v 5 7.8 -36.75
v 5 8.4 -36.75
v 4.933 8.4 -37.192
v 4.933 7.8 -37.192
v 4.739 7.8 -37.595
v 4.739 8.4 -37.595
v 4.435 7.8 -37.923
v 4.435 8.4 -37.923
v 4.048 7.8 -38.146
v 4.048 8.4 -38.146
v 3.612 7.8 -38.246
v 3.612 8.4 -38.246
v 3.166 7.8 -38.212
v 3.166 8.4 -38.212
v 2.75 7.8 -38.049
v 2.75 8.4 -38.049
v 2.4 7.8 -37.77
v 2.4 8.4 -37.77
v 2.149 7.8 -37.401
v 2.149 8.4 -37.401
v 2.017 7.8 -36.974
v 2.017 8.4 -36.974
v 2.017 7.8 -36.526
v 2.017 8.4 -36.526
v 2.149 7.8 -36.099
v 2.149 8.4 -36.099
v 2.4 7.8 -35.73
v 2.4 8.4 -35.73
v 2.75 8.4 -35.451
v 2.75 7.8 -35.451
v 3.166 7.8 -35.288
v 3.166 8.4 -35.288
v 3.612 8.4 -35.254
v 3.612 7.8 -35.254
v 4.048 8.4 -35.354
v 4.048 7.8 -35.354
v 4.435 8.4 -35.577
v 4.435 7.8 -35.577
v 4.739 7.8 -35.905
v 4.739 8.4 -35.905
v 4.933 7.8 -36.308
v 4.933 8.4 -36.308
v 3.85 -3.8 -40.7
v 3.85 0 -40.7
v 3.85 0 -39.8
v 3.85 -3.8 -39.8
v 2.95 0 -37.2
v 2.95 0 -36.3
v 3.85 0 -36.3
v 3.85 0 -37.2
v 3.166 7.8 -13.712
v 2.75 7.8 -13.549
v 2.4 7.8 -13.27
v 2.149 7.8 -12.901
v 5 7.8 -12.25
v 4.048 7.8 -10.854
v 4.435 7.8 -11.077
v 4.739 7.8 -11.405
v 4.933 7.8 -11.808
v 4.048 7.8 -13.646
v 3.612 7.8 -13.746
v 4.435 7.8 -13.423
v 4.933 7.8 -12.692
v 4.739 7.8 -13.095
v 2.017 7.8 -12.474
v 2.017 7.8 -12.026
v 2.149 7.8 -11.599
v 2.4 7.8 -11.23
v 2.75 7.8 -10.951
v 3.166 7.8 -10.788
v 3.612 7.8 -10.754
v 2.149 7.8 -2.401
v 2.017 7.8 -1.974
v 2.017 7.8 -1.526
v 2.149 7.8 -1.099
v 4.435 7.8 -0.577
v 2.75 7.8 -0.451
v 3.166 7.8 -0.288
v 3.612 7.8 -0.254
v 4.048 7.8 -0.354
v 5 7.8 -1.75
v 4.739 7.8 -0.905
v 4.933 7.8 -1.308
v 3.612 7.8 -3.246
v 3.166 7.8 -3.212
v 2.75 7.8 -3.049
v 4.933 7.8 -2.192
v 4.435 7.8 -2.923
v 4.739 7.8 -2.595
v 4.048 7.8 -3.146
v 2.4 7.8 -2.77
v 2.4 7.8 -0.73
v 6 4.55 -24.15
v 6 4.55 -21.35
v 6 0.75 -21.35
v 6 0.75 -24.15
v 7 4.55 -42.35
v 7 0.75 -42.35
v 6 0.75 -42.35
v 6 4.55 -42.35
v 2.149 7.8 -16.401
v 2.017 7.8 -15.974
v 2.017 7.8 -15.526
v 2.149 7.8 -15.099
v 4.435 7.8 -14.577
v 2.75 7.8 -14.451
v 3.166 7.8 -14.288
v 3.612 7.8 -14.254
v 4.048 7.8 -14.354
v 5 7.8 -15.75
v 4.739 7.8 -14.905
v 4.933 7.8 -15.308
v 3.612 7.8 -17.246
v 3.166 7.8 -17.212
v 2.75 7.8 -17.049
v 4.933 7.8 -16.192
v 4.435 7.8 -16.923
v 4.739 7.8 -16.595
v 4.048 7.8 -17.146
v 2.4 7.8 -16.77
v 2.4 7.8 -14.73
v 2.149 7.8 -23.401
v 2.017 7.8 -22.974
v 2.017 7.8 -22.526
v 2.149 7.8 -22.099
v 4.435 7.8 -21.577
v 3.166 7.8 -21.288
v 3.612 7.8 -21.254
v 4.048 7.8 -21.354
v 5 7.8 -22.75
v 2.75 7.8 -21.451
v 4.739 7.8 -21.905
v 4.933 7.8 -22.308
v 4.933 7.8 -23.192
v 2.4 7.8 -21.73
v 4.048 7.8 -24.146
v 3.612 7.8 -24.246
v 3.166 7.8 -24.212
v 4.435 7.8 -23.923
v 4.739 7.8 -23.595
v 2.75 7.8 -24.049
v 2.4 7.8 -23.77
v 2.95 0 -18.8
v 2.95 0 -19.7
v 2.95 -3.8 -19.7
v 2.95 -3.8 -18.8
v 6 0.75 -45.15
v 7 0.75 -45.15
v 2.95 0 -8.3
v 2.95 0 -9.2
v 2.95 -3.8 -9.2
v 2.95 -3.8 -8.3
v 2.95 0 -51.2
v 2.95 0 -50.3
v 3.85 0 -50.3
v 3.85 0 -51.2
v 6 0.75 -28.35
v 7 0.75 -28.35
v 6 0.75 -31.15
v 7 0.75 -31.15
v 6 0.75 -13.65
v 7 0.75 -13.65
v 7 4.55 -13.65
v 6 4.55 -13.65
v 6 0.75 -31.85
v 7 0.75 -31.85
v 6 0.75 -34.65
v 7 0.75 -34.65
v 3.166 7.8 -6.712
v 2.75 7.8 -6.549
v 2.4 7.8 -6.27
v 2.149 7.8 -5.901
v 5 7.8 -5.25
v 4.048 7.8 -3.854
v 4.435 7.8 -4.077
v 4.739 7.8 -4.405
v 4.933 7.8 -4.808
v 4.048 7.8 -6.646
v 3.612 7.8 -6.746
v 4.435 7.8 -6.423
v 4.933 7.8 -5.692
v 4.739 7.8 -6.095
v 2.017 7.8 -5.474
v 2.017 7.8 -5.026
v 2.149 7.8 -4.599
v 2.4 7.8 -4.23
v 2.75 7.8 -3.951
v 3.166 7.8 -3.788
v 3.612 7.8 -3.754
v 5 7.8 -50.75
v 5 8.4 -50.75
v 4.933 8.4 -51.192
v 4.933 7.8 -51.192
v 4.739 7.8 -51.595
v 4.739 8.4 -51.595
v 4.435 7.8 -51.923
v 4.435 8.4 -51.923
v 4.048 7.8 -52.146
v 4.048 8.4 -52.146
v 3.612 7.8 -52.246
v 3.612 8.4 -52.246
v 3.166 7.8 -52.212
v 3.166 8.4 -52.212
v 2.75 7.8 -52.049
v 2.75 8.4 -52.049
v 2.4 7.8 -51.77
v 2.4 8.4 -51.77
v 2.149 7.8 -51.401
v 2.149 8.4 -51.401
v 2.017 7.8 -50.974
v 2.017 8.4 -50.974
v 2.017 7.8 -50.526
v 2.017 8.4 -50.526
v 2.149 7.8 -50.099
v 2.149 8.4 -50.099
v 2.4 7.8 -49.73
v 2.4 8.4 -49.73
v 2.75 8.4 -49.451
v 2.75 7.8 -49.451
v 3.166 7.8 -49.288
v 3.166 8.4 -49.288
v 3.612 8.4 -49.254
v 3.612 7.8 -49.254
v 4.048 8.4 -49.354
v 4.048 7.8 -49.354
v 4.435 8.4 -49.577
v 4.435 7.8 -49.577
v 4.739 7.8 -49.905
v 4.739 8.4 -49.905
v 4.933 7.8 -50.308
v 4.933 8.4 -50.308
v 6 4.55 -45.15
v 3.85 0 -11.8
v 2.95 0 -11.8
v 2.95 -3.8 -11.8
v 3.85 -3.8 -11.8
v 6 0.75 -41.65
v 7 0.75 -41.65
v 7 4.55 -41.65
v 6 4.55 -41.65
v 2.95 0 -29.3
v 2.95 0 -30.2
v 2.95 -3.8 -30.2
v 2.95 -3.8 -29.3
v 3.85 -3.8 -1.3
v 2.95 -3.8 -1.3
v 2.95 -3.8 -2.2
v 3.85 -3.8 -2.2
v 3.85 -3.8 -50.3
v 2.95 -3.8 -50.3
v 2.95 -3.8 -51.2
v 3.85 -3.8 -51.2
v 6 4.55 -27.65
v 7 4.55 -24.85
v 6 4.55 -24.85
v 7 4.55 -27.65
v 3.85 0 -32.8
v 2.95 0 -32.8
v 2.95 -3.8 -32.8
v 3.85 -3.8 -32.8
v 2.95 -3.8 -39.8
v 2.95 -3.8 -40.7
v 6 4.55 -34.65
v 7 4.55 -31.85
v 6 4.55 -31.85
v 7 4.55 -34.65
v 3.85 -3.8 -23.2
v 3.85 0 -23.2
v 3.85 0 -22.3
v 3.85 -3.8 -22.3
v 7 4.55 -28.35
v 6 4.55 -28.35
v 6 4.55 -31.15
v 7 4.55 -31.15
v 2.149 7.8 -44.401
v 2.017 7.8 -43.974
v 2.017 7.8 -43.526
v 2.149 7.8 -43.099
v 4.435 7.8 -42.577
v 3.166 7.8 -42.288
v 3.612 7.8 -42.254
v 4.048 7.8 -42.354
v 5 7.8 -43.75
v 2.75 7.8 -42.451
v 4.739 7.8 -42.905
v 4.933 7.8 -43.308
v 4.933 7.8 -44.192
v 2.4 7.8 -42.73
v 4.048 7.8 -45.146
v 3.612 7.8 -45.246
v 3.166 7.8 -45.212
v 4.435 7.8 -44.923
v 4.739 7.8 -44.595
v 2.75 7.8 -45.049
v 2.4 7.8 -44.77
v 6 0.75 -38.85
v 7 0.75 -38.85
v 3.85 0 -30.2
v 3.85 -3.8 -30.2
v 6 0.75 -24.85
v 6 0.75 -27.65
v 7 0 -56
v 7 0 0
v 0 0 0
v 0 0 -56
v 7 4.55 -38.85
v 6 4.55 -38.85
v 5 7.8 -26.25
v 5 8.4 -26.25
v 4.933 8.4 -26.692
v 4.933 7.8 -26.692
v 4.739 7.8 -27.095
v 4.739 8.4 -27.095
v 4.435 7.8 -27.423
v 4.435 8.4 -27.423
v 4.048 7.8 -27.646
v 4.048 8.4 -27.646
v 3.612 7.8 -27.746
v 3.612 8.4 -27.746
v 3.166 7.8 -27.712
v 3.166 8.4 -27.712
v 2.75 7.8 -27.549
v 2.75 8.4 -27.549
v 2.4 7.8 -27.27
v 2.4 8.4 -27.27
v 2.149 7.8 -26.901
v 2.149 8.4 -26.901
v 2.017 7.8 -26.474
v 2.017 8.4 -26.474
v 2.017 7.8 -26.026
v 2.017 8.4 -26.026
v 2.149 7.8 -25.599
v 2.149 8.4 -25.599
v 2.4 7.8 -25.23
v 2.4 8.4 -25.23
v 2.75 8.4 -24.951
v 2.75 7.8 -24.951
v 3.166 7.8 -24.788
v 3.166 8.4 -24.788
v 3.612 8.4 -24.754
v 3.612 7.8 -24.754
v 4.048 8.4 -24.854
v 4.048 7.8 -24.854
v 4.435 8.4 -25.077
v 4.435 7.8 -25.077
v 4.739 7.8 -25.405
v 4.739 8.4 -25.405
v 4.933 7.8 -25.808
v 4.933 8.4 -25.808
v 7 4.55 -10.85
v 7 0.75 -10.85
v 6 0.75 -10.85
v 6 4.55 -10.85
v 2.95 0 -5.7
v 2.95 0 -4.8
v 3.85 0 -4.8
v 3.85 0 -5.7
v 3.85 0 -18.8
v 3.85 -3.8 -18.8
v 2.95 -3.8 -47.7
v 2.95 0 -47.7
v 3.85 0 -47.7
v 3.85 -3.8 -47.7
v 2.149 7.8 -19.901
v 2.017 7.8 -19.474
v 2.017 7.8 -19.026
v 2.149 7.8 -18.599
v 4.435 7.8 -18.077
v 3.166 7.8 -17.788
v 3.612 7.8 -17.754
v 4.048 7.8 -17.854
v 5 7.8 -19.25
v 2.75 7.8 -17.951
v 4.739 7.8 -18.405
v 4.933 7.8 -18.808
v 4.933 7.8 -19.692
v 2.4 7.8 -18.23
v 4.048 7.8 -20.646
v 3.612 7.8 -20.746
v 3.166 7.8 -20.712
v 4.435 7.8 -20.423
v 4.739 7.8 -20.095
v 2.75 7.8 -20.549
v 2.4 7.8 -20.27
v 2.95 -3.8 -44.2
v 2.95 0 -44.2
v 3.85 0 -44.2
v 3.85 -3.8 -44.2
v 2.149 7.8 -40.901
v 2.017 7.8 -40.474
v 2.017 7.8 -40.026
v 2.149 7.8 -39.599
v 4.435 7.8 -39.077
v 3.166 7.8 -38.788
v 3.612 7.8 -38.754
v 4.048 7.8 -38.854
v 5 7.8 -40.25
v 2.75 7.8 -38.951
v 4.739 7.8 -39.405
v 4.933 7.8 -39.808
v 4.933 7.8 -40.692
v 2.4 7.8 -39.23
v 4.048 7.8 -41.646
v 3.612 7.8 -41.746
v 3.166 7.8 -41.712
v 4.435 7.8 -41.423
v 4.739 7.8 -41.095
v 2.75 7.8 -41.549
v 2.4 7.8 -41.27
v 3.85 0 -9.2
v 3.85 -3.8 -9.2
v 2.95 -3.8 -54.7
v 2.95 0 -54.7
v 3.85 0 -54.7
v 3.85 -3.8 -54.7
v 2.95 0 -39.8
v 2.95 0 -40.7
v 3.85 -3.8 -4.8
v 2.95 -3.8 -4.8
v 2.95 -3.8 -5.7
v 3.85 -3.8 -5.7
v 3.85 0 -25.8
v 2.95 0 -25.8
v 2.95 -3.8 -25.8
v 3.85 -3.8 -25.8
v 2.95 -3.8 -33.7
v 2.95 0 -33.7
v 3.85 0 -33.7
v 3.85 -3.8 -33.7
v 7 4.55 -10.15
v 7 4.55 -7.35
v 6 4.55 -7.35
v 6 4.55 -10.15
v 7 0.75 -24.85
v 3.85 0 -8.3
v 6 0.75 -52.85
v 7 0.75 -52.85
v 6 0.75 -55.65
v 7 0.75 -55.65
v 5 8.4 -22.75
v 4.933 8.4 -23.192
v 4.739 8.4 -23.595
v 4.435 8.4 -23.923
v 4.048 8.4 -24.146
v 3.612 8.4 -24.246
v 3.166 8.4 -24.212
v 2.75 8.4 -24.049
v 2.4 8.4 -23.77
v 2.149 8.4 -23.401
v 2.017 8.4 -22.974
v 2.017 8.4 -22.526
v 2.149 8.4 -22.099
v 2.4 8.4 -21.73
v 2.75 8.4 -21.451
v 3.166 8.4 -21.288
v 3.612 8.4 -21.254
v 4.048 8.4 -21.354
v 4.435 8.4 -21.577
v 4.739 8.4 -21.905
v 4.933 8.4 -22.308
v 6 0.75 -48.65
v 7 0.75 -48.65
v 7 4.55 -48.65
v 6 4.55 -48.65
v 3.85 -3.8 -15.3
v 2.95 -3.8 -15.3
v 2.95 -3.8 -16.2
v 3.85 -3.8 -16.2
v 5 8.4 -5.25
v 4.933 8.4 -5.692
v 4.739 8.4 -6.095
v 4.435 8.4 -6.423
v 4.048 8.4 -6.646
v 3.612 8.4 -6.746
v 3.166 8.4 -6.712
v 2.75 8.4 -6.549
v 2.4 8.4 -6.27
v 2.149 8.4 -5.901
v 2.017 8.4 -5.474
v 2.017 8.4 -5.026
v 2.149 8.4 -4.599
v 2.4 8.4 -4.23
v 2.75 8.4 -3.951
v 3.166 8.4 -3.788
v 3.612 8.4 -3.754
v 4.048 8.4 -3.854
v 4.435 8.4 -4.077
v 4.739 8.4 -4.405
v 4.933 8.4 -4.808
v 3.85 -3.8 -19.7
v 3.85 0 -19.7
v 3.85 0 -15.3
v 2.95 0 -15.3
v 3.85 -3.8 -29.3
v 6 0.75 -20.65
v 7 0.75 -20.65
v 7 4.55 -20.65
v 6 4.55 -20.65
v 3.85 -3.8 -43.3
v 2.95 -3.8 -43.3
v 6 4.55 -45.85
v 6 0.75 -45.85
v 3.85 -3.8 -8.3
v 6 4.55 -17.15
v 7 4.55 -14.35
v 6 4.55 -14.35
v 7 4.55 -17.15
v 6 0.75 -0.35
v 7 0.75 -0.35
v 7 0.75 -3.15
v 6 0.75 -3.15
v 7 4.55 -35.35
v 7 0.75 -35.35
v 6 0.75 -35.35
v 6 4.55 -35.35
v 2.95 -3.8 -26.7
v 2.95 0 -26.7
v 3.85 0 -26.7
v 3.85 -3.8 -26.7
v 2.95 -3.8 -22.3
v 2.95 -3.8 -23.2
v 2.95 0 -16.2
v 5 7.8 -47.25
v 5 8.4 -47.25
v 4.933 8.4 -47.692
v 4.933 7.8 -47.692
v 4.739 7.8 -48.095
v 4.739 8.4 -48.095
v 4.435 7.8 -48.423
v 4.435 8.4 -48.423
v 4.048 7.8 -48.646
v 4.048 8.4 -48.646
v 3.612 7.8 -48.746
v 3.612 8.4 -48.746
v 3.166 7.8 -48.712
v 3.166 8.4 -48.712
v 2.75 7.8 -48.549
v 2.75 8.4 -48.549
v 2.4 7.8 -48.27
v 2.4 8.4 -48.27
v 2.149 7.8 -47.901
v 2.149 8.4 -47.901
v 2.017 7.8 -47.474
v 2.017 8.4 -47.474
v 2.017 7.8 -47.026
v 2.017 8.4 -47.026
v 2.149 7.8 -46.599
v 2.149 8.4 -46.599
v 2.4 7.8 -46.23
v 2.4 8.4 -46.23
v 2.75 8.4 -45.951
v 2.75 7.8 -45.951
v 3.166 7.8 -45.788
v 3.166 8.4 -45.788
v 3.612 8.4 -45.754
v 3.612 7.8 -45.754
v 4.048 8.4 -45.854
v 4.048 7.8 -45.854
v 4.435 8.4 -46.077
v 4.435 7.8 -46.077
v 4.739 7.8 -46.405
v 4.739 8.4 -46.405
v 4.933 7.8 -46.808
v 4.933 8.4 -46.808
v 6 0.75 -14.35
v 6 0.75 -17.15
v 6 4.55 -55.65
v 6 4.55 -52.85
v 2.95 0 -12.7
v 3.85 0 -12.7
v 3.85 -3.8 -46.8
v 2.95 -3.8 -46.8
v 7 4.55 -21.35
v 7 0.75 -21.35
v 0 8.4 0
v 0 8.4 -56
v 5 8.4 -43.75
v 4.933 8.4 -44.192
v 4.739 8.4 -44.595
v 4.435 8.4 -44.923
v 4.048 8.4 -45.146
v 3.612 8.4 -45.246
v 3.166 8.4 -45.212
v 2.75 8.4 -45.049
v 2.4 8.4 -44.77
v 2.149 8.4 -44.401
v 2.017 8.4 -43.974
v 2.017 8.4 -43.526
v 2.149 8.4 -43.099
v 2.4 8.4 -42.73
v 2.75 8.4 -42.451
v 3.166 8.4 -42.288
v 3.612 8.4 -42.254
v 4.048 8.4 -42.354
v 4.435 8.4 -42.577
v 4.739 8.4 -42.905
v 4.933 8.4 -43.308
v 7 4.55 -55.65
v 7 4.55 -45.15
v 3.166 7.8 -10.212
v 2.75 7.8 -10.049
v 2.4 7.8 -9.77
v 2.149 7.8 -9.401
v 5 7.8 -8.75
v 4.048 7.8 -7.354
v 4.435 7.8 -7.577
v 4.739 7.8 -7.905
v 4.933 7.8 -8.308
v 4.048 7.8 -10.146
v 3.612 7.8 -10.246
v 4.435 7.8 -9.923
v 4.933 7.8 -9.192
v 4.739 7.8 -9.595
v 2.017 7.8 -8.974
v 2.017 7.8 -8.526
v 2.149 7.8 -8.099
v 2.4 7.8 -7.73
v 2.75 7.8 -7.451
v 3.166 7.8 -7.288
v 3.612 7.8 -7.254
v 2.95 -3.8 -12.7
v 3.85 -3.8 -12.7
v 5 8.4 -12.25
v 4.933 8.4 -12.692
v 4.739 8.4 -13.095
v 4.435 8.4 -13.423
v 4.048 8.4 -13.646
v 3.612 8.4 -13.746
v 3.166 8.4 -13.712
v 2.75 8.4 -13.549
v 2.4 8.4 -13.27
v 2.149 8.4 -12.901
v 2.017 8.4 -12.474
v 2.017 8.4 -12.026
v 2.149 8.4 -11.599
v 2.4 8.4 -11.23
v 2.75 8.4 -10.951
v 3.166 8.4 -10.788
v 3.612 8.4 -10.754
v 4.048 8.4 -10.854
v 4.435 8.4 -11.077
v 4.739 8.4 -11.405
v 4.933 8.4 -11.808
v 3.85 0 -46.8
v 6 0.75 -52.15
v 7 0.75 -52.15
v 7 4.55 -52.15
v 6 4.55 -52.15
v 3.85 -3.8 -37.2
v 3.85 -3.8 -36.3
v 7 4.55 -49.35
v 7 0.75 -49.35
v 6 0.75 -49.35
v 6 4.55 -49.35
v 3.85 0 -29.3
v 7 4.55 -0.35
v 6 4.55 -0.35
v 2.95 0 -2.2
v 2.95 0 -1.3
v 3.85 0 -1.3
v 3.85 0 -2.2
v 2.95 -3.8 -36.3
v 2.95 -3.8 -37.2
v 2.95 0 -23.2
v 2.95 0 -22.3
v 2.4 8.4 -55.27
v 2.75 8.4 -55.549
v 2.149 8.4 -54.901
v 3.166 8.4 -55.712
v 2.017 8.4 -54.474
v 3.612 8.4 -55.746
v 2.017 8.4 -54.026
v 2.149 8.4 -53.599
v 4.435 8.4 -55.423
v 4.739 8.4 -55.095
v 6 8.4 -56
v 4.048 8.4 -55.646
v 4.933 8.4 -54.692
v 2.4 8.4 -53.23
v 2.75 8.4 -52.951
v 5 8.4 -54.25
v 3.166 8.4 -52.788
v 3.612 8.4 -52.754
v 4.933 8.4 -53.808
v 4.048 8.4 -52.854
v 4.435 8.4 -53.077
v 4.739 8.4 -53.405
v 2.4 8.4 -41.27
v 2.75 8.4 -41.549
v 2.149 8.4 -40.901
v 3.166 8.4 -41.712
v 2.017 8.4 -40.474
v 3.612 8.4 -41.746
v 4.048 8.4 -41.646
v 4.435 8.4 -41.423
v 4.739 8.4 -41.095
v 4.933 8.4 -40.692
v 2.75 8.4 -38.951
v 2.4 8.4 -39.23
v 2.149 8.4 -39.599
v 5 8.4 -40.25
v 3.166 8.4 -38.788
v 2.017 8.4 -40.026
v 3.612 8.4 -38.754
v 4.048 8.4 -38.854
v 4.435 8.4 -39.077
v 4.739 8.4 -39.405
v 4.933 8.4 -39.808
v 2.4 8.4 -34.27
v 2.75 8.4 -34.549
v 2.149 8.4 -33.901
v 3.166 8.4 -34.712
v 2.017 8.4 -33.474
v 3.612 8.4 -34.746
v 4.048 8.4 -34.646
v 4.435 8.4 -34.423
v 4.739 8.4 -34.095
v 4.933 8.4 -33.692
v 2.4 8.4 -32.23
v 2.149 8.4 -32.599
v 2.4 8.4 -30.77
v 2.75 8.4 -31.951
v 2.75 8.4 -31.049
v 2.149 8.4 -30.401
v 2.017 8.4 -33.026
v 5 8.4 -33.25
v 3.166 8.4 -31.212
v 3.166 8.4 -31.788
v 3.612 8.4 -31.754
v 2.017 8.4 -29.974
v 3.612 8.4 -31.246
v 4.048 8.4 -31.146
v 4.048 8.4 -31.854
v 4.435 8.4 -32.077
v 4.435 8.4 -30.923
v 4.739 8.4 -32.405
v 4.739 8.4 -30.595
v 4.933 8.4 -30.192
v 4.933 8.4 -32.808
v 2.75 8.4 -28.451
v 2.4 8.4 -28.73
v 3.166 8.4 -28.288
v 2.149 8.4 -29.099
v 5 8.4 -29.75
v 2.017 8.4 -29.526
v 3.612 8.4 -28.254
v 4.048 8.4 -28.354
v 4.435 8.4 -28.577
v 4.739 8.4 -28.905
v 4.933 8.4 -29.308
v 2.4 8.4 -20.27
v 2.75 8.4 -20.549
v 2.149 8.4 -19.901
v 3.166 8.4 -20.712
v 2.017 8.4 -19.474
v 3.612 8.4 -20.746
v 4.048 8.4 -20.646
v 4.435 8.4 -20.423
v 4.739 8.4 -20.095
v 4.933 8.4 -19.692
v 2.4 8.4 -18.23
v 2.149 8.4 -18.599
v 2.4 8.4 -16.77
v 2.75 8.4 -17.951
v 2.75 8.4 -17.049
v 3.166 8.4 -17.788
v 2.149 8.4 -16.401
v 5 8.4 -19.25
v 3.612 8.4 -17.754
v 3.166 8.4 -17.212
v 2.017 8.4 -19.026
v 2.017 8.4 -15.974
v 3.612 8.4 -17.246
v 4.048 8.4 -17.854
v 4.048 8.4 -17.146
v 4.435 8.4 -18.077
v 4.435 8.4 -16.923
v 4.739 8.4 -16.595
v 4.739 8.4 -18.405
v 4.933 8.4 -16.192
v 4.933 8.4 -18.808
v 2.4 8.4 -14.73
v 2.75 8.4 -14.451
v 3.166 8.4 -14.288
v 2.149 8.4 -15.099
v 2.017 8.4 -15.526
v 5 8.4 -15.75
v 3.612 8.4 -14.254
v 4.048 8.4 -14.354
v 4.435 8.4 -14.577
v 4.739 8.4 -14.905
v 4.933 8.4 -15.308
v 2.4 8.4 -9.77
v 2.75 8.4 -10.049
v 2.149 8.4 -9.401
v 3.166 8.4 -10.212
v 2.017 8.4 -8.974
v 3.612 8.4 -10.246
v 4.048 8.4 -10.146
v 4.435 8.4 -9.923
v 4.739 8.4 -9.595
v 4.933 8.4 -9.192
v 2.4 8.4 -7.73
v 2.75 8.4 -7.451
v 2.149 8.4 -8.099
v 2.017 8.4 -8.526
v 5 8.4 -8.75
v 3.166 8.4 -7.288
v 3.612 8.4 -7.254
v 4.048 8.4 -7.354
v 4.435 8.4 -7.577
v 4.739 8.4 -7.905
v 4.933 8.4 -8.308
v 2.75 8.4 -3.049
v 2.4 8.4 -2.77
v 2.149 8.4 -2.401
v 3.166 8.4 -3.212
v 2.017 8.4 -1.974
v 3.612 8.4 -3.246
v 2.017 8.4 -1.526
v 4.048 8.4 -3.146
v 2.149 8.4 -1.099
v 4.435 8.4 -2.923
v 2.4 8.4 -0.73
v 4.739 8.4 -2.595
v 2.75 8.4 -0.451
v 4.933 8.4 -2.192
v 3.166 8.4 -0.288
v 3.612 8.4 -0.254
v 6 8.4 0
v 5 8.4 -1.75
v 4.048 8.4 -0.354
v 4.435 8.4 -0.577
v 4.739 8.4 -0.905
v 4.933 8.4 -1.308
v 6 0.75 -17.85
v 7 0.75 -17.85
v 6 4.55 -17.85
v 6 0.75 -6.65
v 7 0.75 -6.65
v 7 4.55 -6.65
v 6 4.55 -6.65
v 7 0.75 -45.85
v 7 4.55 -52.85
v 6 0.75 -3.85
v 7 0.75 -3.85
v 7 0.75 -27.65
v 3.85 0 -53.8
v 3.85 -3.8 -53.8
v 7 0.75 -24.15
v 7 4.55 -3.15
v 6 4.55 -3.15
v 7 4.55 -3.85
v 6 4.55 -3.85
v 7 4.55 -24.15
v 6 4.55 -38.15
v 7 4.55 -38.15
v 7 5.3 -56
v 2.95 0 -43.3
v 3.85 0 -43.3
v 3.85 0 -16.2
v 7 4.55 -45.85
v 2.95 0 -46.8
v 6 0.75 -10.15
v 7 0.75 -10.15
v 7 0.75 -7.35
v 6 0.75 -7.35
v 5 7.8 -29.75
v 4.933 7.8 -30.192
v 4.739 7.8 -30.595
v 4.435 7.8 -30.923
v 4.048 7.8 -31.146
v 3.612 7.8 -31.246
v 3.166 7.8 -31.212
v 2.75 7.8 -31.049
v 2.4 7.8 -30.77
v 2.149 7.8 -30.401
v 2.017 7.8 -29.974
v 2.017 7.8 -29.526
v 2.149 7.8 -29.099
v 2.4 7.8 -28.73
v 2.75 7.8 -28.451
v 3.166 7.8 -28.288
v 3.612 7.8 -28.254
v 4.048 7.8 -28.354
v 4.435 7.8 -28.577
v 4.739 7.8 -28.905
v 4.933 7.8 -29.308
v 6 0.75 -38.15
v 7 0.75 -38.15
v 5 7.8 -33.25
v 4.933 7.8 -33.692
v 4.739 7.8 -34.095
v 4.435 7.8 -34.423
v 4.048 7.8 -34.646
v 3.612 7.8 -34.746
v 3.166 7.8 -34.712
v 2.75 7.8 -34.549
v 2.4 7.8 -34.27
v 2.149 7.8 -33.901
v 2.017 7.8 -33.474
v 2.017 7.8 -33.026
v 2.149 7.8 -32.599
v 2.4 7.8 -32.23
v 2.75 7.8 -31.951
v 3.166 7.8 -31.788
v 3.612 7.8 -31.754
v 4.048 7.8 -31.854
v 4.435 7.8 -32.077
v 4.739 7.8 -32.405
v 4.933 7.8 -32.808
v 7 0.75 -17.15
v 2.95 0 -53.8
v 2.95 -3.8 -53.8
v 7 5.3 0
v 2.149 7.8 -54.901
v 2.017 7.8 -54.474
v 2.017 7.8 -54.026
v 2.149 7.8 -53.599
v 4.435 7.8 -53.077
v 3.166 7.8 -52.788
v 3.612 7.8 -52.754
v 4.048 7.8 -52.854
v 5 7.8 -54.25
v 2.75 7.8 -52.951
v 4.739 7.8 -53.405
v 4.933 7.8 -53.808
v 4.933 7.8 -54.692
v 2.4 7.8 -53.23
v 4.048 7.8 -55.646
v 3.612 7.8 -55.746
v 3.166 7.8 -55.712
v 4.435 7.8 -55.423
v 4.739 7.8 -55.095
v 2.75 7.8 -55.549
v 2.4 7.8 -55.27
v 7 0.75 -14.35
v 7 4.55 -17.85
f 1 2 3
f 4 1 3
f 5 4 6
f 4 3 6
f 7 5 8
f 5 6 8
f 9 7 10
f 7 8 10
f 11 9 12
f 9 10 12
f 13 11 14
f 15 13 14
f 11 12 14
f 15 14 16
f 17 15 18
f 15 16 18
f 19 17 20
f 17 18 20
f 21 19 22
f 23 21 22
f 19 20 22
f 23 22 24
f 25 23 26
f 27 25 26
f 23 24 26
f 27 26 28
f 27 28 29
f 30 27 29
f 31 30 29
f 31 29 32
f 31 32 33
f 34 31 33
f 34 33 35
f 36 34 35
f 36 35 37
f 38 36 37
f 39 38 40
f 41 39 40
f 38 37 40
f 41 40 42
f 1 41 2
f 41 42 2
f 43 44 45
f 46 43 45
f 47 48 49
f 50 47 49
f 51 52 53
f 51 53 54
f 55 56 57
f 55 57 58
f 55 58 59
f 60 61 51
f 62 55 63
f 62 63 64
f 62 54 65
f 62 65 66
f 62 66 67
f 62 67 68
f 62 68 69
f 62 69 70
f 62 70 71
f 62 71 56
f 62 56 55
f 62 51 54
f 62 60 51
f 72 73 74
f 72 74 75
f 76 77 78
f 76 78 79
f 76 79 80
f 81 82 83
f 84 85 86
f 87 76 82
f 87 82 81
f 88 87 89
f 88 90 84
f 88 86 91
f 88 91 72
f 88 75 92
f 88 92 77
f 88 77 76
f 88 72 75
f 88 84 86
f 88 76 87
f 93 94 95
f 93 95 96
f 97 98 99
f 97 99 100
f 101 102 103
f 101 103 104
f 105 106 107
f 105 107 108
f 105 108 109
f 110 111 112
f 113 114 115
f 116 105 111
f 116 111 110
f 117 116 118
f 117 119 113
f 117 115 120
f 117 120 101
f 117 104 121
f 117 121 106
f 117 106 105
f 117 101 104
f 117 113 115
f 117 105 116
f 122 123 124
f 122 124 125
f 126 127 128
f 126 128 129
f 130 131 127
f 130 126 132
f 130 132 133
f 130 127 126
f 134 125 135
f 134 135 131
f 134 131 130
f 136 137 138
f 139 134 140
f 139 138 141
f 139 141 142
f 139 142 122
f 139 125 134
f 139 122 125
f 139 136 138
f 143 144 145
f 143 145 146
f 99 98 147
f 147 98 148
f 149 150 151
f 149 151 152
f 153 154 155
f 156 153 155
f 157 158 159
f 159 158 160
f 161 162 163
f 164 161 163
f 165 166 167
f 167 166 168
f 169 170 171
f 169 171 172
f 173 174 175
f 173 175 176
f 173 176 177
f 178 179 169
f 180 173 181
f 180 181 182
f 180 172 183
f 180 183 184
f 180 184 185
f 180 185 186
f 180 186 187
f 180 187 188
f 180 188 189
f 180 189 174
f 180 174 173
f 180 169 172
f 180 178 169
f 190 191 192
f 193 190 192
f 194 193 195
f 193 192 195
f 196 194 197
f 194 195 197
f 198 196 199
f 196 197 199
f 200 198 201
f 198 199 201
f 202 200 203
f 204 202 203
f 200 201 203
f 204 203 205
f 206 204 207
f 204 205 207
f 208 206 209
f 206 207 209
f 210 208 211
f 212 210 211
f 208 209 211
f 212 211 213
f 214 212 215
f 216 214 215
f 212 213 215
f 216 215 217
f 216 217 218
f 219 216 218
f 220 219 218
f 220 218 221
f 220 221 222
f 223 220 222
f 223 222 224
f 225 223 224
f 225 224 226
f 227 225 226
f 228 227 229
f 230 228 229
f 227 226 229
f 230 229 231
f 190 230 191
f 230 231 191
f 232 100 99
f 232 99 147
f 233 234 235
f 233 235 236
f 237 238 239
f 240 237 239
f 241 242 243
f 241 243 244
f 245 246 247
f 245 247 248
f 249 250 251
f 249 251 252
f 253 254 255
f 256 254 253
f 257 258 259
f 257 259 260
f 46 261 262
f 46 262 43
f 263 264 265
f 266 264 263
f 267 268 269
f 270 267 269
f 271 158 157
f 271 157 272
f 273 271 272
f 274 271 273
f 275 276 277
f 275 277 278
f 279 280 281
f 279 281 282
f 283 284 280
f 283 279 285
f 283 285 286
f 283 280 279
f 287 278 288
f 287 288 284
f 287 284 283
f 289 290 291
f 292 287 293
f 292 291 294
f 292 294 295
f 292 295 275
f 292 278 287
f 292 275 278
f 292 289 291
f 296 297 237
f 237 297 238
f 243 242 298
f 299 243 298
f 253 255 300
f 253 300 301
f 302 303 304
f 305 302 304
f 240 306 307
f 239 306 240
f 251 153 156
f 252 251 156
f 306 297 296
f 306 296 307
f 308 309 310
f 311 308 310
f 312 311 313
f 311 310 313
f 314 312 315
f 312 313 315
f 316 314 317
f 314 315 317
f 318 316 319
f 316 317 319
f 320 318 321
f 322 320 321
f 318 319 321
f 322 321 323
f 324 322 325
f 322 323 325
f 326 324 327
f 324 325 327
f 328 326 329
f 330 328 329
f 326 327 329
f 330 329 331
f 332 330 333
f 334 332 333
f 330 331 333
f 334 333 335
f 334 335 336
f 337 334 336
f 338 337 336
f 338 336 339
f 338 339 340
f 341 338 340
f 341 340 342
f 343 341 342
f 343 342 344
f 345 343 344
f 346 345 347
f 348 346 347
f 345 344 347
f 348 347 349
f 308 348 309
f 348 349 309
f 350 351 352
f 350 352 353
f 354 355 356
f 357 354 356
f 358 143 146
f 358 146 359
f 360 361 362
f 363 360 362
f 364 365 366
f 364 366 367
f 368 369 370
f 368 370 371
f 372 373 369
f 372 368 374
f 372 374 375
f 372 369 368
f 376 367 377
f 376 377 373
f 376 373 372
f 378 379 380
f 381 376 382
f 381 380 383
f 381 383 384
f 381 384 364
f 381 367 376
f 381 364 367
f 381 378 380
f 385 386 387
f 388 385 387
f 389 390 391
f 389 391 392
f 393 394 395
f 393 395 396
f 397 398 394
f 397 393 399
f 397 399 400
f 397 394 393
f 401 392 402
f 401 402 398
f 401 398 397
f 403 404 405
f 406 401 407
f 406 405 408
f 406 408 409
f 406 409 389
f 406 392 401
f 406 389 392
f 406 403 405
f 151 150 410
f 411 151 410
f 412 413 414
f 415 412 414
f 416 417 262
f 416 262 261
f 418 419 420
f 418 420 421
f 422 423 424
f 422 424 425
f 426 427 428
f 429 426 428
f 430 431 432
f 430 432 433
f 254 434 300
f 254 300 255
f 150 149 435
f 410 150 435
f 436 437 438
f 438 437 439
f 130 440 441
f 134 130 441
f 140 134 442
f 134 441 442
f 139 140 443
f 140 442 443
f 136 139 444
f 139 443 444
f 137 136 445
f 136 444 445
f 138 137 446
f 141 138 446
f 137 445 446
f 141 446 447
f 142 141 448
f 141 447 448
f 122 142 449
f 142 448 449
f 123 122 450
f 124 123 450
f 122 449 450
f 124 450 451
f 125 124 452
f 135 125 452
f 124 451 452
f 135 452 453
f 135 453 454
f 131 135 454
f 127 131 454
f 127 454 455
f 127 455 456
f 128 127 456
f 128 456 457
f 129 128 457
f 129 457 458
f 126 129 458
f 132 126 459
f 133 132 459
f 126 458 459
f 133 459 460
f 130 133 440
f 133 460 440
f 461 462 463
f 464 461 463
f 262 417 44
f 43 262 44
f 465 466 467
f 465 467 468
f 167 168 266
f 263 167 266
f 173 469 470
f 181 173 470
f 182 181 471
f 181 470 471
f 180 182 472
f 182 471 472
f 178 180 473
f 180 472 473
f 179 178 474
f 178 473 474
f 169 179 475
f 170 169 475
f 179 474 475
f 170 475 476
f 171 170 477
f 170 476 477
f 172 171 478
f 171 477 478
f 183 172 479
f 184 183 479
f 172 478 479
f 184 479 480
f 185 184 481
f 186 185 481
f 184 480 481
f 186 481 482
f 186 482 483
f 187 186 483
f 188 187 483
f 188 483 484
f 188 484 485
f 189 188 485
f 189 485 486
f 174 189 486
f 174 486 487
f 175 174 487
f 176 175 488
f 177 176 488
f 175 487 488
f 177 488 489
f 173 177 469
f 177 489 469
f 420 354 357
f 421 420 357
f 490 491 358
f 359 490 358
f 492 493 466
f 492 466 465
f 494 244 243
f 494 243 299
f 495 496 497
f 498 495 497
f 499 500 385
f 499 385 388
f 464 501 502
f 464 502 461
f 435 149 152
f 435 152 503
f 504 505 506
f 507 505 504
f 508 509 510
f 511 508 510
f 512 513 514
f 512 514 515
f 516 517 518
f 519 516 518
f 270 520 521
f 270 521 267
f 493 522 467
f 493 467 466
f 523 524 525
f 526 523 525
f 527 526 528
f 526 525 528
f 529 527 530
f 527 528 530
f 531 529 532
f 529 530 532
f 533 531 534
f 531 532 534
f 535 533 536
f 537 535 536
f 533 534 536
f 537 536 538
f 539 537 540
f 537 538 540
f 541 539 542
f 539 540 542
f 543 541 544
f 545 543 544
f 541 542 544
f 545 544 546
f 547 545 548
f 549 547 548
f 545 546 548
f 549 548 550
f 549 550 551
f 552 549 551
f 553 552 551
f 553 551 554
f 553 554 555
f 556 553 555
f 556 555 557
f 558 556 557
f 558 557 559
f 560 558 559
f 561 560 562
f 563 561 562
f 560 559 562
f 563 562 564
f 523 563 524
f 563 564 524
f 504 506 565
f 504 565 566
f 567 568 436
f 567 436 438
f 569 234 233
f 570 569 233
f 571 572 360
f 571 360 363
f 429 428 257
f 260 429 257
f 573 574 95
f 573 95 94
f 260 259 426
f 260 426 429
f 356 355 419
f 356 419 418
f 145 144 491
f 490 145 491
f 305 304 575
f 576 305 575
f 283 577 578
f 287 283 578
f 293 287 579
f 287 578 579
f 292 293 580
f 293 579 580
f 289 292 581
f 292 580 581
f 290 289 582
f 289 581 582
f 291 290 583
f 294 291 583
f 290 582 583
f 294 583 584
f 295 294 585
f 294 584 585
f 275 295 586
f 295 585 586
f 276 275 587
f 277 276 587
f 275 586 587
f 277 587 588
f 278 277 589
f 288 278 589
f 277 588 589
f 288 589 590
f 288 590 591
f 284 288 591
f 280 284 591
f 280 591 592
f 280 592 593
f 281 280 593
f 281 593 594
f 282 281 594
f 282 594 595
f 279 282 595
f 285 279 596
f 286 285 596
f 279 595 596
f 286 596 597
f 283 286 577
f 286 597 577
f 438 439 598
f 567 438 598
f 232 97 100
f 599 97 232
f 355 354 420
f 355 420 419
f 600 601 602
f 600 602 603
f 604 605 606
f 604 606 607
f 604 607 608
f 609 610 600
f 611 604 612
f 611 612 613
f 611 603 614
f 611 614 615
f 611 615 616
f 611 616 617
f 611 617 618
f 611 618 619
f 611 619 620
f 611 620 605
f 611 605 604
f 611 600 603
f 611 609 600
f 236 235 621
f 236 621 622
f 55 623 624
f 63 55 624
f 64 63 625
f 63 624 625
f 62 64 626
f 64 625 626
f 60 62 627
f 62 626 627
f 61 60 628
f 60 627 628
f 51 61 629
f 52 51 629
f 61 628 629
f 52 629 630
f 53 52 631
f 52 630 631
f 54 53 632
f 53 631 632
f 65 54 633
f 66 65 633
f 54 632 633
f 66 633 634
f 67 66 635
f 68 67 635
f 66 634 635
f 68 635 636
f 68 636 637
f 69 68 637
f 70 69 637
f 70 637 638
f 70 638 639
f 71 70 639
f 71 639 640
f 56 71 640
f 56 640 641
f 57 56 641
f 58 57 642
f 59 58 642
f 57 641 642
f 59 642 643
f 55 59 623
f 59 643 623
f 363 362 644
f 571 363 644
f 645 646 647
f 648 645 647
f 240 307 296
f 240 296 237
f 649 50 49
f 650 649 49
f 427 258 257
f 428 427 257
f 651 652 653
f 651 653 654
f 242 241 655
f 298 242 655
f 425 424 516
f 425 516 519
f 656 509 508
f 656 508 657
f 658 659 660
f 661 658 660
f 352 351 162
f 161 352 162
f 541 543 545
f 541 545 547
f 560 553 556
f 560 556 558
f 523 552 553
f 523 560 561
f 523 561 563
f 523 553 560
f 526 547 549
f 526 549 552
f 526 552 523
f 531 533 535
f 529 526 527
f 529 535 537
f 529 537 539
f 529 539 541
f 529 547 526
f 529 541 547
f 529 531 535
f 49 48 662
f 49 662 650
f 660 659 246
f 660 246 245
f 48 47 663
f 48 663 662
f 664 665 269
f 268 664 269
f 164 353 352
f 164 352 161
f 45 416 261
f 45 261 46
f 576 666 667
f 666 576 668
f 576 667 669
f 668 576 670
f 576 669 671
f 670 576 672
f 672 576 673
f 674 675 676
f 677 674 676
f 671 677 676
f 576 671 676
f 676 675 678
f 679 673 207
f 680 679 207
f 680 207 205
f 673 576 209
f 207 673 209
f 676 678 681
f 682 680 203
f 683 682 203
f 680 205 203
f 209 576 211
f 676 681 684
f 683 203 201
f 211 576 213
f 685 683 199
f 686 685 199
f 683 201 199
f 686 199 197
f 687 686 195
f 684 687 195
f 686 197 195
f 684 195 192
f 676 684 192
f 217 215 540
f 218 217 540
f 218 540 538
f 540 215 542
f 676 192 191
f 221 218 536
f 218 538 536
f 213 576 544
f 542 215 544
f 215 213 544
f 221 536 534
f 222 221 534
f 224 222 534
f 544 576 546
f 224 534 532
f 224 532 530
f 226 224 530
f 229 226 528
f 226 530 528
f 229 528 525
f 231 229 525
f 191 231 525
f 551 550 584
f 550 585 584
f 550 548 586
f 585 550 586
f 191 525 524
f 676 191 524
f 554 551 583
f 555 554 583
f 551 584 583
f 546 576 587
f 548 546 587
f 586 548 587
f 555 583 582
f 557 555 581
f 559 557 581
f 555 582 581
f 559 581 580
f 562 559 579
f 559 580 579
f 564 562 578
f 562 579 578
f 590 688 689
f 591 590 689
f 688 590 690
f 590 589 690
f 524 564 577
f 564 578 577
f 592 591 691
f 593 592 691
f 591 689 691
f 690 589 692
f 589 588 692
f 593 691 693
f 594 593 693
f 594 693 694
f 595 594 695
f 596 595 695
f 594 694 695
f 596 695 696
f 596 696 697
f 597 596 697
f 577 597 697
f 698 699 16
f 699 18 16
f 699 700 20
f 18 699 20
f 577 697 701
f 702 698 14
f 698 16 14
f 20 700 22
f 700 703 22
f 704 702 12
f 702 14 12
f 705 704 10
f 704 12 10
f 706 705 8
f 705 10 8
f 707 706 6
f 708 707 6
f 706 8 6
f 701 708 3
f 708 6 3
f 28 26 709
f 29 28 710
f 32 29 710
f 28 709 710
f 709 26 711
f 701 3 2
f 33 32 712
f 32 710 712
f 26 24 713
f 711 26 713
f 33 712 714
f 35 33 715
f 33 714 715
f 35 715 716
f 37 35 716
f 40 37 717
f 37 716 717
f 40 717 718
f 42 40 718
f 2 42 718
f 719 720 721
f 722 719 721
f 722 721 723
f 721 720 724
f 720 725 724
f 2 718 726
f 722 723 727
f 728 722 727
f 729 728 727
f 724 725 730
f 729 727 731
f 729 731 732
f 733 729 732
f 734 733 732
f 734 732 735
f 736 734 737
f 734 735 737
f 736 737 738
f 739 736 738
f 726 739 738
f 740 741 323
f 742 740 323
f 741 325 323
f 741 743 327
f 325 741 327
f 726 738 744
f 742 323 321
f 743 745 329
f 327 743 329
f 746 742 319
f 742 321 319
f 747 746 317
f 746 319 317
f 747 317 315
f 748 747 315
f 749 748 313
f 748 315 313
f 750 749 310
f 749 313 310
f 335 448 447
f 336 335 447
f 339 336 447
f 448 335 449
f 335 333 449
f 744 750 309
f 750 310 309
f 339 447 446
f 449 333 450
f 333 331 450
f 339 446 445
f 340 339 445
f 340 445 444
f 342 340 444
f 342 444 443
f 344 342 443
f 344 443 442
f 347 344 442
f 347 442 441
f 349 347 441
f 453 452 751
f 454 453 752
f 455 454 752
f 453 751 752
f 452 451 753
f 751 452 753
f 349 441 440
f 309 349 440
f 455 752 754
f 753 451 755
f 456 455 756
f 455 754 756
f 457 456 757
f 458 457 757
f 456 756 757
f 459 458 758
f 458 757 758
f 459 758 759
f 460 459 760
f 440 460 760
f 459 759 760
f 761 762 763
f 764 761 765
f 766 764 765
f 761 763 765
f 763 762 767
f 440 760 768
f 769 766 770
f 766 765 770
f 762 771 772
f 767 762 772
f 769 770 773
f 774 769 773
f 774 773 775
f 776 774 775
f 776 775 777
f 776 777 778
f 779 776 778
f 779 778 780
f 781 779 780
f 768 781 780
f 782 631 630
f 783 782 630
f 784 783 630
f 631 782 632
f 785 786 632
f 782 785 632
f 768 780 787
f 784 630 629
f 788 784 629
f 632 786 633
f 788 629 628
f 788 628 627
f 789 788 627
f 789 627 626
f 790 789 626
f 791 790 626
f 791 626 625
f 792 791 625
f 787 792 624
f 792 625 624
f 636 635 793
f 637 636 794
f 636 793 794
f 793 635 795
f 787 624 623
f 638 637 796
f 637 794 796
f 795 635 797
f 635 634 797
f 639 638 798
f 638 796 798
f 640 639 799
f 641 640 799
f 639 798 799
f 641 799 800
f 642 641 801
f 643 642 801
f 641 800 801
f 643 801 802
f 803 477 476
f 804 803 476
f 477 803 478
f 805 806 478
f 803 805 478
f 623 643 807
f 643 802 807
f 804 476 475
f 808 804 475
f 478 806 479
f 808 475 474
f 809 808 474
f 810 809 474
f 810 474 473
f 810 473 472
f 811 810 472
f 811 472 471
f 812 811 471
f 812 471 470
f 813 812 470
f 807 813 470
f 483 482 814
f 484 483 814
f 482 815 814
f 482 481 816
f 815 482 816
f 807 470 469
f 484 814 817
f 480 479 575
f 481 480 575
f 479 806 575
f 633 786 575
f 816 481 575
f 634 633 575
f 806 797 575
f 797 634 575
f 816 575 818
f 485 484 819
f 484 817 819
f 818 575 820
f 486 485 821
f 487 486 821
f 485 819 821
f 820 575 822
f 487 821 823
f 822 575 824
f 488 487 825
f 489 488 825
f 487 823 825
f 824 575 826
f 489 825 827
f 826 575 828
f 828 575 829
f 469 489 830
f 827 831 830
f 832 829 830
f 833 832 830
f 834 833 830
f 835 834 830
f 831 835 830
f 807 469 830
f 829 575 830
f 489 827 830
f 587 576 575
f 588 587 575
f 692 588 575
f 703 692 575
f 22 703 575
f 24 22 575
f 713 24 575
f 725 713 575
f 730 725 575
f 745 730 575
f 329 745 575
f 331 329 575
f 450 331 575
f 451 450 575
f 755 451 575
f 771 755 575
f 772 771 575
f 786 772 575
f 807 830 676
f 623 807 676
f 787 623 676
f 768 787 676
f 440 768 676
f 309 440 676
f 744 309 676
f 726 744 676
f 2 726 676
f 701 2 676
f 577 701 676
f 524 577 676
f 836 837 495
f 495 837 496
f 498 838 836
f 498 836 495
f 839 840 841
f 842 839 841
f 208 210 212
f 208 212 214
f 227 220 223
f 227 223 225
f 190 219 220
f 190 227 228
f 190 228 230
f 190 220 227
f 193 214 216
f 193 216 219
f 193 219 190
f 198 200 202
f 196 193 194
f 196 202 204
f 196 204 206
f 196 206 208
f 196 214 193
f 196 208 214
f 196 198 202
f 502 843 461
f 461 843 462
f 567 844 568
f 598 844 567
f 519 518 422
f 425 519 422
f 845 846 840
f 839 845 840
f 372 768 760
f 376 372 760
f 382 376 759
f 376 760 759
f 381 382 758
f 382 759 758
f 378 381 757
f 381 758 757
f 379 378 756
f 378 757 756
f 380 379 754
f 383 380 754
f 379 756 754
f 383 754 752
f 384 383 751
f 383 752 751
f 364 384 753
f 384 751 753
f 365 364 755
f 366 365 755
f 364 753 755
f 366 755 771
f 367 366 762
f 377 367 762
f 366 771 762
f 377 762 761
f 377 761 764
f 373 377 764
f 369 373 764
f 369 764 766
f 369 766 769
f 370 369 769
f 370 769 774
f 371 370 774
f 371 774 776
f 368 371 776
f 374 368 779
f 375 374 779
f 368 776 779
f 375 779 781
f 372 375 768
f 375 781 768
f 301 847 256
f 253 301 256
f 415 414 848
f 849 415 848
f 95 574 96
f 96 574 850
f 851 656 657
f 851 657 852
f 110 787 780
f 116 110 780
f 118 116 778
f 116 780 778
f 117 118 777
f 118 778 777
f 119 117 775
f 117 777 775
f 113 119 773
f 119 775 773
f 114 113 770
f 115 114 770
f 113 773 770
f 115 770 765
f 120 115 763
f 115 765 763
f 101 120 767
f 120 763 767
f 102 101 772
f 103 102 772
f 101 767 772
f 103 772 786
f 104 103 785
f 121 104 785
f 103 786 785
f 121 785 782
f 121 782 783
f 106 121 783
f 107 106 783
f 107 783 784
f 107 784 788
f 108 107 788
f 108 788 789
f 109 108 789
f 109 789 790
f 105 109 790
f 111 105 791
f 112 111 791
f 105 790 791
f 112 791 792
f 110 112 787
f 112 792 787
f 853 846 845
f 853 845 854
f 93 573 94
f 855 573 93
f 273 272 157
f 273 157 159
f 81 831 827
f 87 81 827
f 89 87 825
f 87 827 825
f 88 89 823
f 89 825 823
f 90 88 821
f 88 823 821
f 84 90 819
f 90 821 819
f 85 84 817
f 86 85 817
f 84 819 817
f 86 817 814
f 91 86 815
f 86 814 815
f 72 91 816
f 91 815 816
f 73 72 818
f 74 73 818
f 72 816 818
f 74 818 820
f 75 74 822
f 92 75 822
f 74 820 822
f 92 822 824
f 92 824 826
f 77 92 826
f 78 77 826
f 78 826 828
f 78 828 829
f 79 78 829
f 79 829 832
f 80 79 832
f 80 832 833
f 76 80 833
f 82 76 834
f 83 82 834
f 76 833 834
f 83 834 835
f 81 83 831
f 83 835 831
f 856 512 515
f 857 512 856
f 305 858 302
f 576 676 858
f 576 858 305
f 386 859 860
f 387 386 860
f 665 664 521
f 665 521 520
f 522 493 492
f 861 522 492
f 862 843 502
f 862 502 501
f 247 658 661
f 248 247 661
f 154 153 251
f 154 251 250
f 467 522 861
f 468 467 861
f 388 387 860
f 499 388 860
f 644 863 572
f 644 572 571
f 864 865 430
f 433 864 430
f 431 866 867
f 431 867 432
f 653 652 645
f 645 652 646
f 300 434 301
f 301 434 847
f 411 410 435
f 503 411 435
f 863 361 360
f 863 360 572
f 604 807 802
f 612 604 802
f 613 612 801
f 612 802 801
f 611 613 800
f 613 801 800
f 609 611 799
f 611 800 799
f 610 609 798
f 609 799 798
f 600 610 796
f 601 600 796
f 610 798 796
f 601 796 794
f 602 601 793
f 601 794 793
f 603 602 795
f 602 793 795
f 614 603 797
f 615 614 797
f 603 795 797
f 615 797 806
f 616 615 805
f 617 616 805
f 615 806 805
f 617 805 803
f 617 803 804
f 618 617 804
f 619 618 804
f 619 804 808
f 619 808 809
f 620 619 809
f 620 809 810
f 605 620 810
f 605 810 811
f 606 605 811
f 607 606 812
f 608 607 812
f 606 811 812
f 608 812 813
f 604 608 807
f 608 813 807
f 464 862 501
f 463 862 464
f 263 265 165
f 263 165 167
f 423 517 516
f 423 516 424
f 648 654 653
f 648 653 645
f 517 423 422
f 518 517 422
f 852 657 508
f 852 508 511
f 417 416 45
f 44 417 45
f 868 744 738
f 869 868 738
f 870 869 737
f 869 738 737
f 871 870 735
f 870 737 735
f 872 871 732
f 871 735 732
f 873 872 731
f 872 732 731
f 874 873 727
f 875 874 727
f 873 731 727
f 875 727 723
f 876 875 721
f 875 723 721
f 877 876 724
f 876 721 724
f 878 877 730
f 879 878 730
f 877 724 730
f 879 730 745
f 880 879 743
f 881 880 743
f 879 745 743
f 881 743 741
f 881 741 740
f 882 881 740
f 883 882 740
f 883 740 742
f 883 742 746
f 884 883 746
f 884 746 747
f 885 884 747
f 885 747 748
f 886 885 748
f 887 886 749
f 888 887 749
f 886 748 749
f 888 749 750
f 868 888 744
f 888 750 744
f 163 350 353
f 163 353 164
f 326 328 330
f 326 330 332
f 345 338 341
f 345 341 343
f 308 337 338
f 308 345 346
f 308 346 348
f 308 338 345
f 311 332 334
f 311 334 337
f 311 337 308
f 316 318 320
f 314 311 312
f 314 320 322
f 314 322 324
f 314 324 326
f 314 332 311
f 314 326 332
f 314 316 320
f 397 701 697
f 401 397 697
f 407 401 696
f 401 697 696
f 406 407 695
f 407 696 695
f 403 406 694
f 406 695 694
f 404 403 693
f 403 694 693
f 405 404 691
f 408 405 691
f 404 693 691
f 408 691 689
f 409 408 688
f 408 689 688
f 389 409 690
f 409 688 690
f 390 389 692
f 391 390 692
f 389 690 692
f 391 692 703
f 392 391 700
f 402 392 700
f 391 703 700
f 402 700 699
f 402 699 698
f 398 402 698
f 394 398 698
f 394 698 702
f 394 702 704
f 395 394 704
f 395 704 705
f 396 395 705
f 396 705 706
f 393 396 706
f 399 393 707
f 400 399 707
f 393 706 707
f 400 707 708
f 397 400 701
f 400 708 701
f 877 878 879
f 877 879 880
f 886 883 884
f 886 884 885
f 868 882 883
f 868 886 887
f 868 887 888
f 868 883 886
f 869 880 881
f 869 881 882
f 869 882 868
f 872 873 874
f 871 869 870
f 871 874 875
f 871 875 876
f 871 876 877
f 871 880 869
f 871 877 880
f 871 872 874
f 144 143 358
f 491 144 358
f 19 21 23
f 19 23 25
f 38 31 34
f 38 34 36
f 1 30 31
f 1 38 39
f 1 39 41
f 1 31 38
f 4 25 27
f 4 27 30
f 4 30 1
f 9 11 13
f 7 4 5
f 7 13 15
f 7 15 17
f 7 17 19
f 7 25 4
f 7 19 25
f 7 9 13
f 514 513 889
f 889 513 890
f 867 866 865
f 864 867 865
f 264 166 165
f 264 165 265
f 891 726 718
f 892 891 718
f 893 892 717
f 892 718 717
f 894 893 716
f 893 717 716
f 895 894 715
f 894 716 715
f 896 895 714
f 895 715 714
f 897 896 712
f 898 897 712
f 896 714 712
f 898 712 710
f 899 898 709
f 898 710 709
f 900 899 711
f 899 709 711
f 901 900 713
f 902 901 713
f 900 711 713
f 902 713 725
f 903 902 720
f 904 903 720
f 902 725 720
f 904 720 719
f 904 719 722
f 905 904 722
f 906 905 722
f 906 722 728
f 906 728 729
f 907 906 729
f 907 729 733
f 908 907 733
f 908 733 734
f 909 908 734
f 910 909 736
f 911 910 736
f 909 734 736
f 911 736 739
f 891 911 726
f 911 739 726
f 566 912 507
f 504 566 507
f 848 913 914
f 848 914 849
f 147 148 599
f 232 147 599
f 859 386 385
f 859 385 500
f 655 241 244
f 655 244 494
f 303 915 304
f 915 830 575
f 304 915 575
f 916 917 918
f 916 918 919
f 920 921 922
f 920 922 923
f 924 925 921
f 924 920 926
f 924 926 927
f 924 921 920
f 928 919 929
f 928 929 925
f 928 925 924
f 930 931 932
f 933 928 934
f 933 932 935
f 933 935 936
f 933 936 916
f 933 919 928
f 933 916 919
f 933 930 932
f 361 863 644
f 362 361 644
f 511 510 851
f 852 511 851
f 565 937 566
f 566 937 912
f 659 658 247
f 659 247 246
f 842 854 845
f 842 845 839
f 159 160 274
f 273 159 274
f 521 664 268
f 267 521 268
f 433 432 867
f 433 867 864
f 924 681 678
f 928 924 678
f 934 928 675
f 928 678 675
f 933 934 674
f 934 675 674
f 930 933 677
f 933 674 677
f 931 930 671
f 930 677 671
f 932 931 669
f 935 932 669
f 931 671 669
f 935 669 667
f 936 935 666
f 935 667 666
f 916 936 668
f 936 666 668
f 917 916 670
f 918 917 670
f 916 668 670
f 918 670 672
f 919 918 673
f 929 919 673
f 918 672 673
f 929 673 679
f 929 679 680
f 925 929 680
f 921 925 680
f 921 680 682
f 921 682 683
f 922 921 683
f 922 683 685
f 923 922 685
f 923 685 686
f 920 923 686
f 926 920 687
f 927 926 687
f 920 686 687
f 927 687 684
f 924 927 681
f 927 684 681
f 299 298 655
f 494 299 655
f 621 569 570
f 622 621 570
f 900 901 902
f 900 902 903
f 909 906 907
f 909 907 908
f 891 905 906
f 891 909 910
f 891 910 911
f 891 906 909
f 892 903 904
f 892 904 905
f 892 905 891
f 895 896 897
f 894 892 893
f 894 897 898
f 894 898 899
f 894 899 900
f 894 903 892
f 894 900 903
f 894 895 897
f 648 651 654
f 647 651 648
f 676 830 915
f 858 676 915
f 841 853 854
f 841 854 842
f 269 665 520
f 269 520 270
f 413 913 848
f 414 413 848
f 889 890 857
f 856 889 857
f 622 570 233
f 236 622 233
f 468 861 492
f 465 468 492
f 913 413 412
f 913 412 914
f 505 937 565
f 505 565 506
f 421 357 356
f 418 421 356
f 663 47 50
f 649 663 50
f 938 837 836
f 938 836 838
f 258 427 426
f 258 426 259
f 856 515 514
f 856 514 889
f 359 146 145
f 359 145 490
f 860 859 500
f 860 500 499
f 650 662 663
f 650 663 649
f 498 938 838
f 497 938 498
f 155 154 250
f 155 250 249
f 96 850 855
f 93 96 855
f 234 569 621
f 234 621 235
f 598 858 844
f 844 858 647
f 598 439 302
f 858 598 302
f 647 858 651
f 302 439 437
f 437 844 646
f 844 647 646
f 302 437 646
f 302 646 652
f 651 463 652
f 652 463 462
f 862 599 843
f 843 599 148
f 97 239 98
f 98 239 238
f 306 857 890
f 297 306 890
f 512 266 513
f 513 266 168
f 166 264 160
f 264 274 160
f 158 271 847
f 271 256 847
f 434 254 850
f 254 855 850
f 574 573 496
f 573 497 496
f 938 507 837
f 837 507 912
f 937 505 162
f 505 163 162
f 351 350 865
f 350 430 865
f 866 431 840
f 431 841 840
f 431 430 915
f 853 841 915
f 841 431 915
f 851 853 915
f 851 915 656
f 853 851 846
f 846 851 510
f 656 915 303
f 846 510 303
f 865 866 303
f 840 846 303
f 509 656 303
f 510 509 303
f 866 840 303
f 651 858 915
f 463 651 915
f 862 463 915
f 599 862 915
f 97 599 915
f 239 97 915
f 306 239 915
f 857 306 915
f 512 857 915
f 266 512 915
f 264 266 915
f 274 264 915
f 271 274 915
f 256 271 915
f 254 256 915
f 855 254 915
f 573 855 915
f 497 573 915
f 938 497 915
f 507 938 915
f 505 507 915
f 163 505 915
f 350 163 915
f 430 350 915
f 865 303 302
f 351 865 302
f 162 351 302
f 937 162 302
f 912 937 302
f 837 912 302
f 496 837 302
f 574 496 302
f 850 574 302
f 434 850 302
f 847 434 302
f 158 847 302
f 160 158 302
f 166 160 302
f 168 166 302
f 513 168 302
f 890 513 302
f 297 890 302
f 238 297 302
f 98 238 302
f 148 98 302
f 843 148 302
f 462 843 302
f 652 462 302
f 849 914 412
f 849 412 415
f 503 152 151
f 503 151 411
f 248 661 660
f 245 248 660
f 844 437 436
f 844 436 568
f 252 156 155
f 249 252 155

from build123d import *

# Parameters (mm, degrees)
BOSS_EXTRUDE1_DEPTH    = 56
SKETCH3_R              = 1.5
CUT_EXTRUDE1_DEPTH     = 0.6
SKETCH4_W              = 2.8
SKETCH4_H              = 3.8
CUT_EXTRUDE2_DEPTH     = 1
SKETCH5_W              = 0.9
SKETCH5_H              = 0.9
BOSS_EXTRUDE2_DEPTH    = 3.8
BOSS_EXTRUDE2_2_DEPTH  = 3.8
BOSS_EXTRUDE2_3_DEPTH  = 3.8
BOSS_EXTRUDE2_4_DEPTH  = 3.8
BOSS_EXTRUDE2_5_DEPTH  = 3.8
BOSS_EXTRUDE2_6_DEPTH  = 3.8
BOSS_EXTRUDE2_7_DEPTH  = 3.8
BOSS_EXTRUDE2_8_DEPTH  = 3.8
BOSS_EXTRUDE2_9_DEPTH  = 3.8
BOSS_EXTRUDE2_10_DEPTH = 3.8
BOSS_EXTRUDE2_11_DEPTH = 3.8
BOSS_EXTRUDE2_12_DEPTH = 3.8
BOSS_EXTRUDE2_13_DEPTH = 3.8
BOSS_EXTRUDE2_14_DEPTH = 3.8
BOSS_EXTRUDE2_15_DEPTH = 3.8
BOSS_EXTRUDE2_16_DEPTH = 3.8


with BuildPart() as part:
    # Sketch2 → Boss-Extrude1 (new body)
    with BuildSketch(Plane.XY):
        Polygon((0, 0), (0, 8.4), (6, 8.4), (7, 5.3), (7, 0), align=None)
    extrude(amount=-BOSS_EXTRUDE1_DEPTH)

    # Sketch3 → Cut-Extrude1 (cut)
    with BuildSketch(Plane(origin=(0, 8.4, 0), x_dir=(1, 0, 0), z_dir=(0, 1, 0))):
        with Locations((3.5, 1.75)):
            Circle(SKETCH3_R)
        with Locations((3.5, 5.25)):
            Circle(SKETCH3_R)
        with Locations((3.5, 8.75)):
            Circle(SKETCH3_R)
        with Locations((3.5, 12.25)):
            Circle(SKETCH3_R)
        with Locations((3.5, 15.75)):
            Circle(SKETCH3_R)
        with Locations((3.5, 19.25)):
            Circle(SKETCH3_R)
        with Locations((3.5, 22.75)):
            Circle(SKETCH3_R)
        with Locations((3.5, 26.25)):
            Circle(SKETCH3_R)
        with Locations((3.5, 29.75)):
            Circle(SKETCH3_R)
        with Locations((3.5, 33.25)):
            Circle(SKETCH3_R)
        with Locations((3.5, 36.75)):
            Circle(SKETCH3_R)
        with Locations((3.5, 40.25)):
            Circle(SKETCH3_R)
        with Locations((3.5, 43.75)):
            Circle(SKETCH3_R)
        with Locations((3.5, 47.25)):
            Circle(SKETCH3_R)
        with Locations((3.5, 50.75)):
            Circle(SKETCH3_R)
        with Locations((3.5, 54.25)):
            Circle(SKETCH3_R)
    extrude(amount=-CUT_EXTRUDE1_DEPTH, mode=Mode.SUBTRACT)

    # Sketch4 → Cut-Extrude2 (cut)
    with BuildSketch(Plane(origin=(7, 0, 0), x_dir=(0, 0, -1), z_dir=(1, 0, 0))):
        with Locations((5.25, 2.65)):
            Rectangle(SKETCH4_W, SKETCH4_H)
        with Locations((1.75, 2.65)):
            Rectangle(SKETCH4_W, SKETCH4_H)
        with Locations((8.75, 2.65)):
            Rectangle(SKETCH4_W, SKETCH4_H)
        with Locations((12.25, 2.65)):
            Rectangle(SKETCH4_W, SKETCH4_H)
        with Locations((15.75, 2.65)):
            Rectangle(SKETCH4_W, SKETCH4_H)
        with Locations((19.25, 2.65)):
            Rectangle(SKETCH4_W, SKETCH4_H)
        with Locations((22.75, 2.65)):
            Rectangle(SKETCH4_W, SKETCH4_H)
        with Locations((26.25, 2.65)):
            Rectangle(SKETCH4_W, SKETCH4_H)
        with Locations((29.75, 2.65)):
            Rectangle(SKETCH4_W, SKETCH4_H)
        with Locations((33.25, 2.65)):
            Rectangle(SKETCH4_W, SKETCH4_H)
        with Locations((36.75, 2.65)):
            Rectangle(SKETCH4_W, SKETCH4_H)
        with Locations((40.25, 2.65)):
            Rectangle(SKETCH4_W, SKETCH4_H)
        with Locations((43.75, 2.65)):
            Rectangle(SKETCH4_W, SKETCH4_H)
        with Locations((47.25, 2.65)):
            Rectangle(SKETCH4_W, SKETCH4_H)
        with Locations((50.75, 2.65)):
            Rectangle(SKETCH4_W, SKETCH4_H)
        with Locations((54.25, 2.65)):
            Rectangle(SKETCH4_W, SKETCH4_H)
    extrude(amount=-CUT_EXTRUDE2_DEPTH, mode=Mode.SUBTRACT)


with BuildPart() as body_2:
    # Sketch5 → Boss-Extrude2 (new body)
    with BuildSketch(Plane.XZ):
        with Locations((3.4, -1.75)):
            Rectangle(SKETCH5_W, SKETCH5_H)
    extrude(amount=BOSS_EXTRUDE2_DEPTH)


with BuildPart() as body_3:
    # Sketch5 → Boss-Extrude2 2 (new body)
    with BuildSketch(Plane.XZ):
        with Locations((3.4, -5.25)):
            Rectangle(SKETCH5_W, SKETCH5_H)
    extrude(amount=BOSS_EXTRUDE2_2_DEPTH)


with BuildPart() as body_4:
    # Sketch5 → Boss-Extrude2 3 (new body)
    with BuildSketch(Plane.XZ):
        with Locations((3.4, -8.75)):
            Rectangle(SKETCH5_W, SKETCH5_H)
    extrude(amount=BOSS_EXTRUDE2_3_DEPTH)


with BuildPart() as body_5:
    # Sketch5 → Boss-Extrude2 4 (new body)
    with BuildSketch(Plane.XZ):
        with Locations((3.4, -12.25)):
            Rectangle(SKETCH5_W, SKETCH5_H)
    extrude(amount=BOSS_EXTRUDE2_4_DEPTH)


with BuildPart() as body_6:
    # Sketch5 → Boss-Extrude2 5 (new body)
    with BuildSketch(Plane.XZ):
        with Locations((3.4, -15.75)):
            Rectangle(SKETCH5_W, SKETCH5_H)
    extrude(amount=BOSS_EXTRUDE2_5_DEPTH)


with BuildPart() as body_7:
    # Sketch5 → Boss-Extrude2 6 (new body)
    with BuildSketch(Plane.XZ):
        with Locations((3.4, -19.25)):
            Rectangle(SKETCH5_W, SKETCH5_H)
    extrude(amount=BOSS_EXTRUDE2_6_DEPTH)


with BuildPart() as body_8:
    # Sketch5 → Boss-Extrude2 7 (new body)
    with BuildSketch(Plane.XZ):
        with Locations((3.4, -22.75)):
            Rectangle(SKETCH5_W, SKETCH5_H)
    extrude(amount=BOSS_EXTRUDE2_7_DEPTH)


with BuildPart() as body_9:
    # Sketch5 → Boss-Extrude2 8 (new body)
    with BuildSketch(Plane.XZ):
        with Locations((3.4, -26.25)):
            Rectangle(SKETCH5_W, SKETCH5_H)
    extrude(amount=BOSS_EXTRUDE2_8_DEPTH)


with BuildPart() as body_10:
    # Sketch5 → Boss-Extrude2 9 (new body)
    with BuildSketch(Plane.XZ):
        with Locations((3.4, -29.75)):
            Rectangle(SKETCH5_W, SKETCH5_H)
    extrude(amount=BOSS_EXTRUDE2_9_DEPTH)


with BuildPart() as body_11:
    # Sketch5 → Boss-Extrude2 10 (new body)
    with BuildSketch(Plane.XZ):
        with Locations((3.4, -33.25)):
            Rectangle(SKETCH5_W, SKETCH5_H)
    extrude(amount=BOSS_EXTRUDE2_10_DEPTH)


with BuildPart() as body_12:
    # Sketch5 → Boss-Extrude2 11 (new body)
    with BuildSketch(Plane.XZ):
        with Locations((3.4, -36.75)):
            Rectangle(SKETCH5_W, SKETCH5_H)
    extrude(amount=BOSS_EXTRUDE2_11_DEPTH)


with BuildPart() as body_13:
    # Sketch5 → Boss-Extrude2 12 (new body)
    with BuildSketch(Plane.XZ):
        with Locations((3.4, -40.25)):
            Rectangle(SKETCH5_W, SKETCH5_H)
    extrude(amount=BOSS_EXTRUDE2_12_DEPTH)


with BuildPart() as body_14:
    # Sketch5 → Boss-Extrude2 13 (new body)
    with BuildSketch(Plane.XZ):
        with Locations((3.4, -43.75)):
            Rectangle(SKETCH5_W, SKETCH5_H)
    extrude(amount=BOSS_EXTRUDE2_13_DEPTH)


with BuildPart() as body_15:
    # Sketch5 → Boss-Extrude2 14 (new body)
    with BuildSketch(Plane.XZ):
        with Locations((3.4, -47.25)):
            Rectangle(SKETCH5_W, SKETCH5_H)
    extrude(amount=BOSS_EXTRUDE2_14_DEPTH)


with BuildPart() as body_16:
    # Sketch5 → Boss-Extrude2 15 (new body)
    with BuildSketch(Plane.XZ):
        with Locations((3.4, -50.75)):
            Rectangle(SKETCH5_W, SKETCH5_H)
    extrude(amount=BOSS_EXTRUDE2_15_DEPTH)


with BuildPart() as body_17:
    # Sketch5 → Boss-Extrude2 16 (new body)
    with BuildSketch(Plane.XZ):
        with Locations((3.4, -54.25)):
            Rectangle(SKETCH5_W, SKETCH5_H)
    extrude(amount=BOSS_EXTRUDE2_16_DEPTH)


solid = Compound([part.part, body_2.part, body_3.part, body_4.part, body_5.part, body_6.part, body_7.part, body_8.part, body_9.part, body_10.part, body_11.part, body_12.part, body_13.part, body_14.part, body_15.part, body_16.part, body_17.part])
